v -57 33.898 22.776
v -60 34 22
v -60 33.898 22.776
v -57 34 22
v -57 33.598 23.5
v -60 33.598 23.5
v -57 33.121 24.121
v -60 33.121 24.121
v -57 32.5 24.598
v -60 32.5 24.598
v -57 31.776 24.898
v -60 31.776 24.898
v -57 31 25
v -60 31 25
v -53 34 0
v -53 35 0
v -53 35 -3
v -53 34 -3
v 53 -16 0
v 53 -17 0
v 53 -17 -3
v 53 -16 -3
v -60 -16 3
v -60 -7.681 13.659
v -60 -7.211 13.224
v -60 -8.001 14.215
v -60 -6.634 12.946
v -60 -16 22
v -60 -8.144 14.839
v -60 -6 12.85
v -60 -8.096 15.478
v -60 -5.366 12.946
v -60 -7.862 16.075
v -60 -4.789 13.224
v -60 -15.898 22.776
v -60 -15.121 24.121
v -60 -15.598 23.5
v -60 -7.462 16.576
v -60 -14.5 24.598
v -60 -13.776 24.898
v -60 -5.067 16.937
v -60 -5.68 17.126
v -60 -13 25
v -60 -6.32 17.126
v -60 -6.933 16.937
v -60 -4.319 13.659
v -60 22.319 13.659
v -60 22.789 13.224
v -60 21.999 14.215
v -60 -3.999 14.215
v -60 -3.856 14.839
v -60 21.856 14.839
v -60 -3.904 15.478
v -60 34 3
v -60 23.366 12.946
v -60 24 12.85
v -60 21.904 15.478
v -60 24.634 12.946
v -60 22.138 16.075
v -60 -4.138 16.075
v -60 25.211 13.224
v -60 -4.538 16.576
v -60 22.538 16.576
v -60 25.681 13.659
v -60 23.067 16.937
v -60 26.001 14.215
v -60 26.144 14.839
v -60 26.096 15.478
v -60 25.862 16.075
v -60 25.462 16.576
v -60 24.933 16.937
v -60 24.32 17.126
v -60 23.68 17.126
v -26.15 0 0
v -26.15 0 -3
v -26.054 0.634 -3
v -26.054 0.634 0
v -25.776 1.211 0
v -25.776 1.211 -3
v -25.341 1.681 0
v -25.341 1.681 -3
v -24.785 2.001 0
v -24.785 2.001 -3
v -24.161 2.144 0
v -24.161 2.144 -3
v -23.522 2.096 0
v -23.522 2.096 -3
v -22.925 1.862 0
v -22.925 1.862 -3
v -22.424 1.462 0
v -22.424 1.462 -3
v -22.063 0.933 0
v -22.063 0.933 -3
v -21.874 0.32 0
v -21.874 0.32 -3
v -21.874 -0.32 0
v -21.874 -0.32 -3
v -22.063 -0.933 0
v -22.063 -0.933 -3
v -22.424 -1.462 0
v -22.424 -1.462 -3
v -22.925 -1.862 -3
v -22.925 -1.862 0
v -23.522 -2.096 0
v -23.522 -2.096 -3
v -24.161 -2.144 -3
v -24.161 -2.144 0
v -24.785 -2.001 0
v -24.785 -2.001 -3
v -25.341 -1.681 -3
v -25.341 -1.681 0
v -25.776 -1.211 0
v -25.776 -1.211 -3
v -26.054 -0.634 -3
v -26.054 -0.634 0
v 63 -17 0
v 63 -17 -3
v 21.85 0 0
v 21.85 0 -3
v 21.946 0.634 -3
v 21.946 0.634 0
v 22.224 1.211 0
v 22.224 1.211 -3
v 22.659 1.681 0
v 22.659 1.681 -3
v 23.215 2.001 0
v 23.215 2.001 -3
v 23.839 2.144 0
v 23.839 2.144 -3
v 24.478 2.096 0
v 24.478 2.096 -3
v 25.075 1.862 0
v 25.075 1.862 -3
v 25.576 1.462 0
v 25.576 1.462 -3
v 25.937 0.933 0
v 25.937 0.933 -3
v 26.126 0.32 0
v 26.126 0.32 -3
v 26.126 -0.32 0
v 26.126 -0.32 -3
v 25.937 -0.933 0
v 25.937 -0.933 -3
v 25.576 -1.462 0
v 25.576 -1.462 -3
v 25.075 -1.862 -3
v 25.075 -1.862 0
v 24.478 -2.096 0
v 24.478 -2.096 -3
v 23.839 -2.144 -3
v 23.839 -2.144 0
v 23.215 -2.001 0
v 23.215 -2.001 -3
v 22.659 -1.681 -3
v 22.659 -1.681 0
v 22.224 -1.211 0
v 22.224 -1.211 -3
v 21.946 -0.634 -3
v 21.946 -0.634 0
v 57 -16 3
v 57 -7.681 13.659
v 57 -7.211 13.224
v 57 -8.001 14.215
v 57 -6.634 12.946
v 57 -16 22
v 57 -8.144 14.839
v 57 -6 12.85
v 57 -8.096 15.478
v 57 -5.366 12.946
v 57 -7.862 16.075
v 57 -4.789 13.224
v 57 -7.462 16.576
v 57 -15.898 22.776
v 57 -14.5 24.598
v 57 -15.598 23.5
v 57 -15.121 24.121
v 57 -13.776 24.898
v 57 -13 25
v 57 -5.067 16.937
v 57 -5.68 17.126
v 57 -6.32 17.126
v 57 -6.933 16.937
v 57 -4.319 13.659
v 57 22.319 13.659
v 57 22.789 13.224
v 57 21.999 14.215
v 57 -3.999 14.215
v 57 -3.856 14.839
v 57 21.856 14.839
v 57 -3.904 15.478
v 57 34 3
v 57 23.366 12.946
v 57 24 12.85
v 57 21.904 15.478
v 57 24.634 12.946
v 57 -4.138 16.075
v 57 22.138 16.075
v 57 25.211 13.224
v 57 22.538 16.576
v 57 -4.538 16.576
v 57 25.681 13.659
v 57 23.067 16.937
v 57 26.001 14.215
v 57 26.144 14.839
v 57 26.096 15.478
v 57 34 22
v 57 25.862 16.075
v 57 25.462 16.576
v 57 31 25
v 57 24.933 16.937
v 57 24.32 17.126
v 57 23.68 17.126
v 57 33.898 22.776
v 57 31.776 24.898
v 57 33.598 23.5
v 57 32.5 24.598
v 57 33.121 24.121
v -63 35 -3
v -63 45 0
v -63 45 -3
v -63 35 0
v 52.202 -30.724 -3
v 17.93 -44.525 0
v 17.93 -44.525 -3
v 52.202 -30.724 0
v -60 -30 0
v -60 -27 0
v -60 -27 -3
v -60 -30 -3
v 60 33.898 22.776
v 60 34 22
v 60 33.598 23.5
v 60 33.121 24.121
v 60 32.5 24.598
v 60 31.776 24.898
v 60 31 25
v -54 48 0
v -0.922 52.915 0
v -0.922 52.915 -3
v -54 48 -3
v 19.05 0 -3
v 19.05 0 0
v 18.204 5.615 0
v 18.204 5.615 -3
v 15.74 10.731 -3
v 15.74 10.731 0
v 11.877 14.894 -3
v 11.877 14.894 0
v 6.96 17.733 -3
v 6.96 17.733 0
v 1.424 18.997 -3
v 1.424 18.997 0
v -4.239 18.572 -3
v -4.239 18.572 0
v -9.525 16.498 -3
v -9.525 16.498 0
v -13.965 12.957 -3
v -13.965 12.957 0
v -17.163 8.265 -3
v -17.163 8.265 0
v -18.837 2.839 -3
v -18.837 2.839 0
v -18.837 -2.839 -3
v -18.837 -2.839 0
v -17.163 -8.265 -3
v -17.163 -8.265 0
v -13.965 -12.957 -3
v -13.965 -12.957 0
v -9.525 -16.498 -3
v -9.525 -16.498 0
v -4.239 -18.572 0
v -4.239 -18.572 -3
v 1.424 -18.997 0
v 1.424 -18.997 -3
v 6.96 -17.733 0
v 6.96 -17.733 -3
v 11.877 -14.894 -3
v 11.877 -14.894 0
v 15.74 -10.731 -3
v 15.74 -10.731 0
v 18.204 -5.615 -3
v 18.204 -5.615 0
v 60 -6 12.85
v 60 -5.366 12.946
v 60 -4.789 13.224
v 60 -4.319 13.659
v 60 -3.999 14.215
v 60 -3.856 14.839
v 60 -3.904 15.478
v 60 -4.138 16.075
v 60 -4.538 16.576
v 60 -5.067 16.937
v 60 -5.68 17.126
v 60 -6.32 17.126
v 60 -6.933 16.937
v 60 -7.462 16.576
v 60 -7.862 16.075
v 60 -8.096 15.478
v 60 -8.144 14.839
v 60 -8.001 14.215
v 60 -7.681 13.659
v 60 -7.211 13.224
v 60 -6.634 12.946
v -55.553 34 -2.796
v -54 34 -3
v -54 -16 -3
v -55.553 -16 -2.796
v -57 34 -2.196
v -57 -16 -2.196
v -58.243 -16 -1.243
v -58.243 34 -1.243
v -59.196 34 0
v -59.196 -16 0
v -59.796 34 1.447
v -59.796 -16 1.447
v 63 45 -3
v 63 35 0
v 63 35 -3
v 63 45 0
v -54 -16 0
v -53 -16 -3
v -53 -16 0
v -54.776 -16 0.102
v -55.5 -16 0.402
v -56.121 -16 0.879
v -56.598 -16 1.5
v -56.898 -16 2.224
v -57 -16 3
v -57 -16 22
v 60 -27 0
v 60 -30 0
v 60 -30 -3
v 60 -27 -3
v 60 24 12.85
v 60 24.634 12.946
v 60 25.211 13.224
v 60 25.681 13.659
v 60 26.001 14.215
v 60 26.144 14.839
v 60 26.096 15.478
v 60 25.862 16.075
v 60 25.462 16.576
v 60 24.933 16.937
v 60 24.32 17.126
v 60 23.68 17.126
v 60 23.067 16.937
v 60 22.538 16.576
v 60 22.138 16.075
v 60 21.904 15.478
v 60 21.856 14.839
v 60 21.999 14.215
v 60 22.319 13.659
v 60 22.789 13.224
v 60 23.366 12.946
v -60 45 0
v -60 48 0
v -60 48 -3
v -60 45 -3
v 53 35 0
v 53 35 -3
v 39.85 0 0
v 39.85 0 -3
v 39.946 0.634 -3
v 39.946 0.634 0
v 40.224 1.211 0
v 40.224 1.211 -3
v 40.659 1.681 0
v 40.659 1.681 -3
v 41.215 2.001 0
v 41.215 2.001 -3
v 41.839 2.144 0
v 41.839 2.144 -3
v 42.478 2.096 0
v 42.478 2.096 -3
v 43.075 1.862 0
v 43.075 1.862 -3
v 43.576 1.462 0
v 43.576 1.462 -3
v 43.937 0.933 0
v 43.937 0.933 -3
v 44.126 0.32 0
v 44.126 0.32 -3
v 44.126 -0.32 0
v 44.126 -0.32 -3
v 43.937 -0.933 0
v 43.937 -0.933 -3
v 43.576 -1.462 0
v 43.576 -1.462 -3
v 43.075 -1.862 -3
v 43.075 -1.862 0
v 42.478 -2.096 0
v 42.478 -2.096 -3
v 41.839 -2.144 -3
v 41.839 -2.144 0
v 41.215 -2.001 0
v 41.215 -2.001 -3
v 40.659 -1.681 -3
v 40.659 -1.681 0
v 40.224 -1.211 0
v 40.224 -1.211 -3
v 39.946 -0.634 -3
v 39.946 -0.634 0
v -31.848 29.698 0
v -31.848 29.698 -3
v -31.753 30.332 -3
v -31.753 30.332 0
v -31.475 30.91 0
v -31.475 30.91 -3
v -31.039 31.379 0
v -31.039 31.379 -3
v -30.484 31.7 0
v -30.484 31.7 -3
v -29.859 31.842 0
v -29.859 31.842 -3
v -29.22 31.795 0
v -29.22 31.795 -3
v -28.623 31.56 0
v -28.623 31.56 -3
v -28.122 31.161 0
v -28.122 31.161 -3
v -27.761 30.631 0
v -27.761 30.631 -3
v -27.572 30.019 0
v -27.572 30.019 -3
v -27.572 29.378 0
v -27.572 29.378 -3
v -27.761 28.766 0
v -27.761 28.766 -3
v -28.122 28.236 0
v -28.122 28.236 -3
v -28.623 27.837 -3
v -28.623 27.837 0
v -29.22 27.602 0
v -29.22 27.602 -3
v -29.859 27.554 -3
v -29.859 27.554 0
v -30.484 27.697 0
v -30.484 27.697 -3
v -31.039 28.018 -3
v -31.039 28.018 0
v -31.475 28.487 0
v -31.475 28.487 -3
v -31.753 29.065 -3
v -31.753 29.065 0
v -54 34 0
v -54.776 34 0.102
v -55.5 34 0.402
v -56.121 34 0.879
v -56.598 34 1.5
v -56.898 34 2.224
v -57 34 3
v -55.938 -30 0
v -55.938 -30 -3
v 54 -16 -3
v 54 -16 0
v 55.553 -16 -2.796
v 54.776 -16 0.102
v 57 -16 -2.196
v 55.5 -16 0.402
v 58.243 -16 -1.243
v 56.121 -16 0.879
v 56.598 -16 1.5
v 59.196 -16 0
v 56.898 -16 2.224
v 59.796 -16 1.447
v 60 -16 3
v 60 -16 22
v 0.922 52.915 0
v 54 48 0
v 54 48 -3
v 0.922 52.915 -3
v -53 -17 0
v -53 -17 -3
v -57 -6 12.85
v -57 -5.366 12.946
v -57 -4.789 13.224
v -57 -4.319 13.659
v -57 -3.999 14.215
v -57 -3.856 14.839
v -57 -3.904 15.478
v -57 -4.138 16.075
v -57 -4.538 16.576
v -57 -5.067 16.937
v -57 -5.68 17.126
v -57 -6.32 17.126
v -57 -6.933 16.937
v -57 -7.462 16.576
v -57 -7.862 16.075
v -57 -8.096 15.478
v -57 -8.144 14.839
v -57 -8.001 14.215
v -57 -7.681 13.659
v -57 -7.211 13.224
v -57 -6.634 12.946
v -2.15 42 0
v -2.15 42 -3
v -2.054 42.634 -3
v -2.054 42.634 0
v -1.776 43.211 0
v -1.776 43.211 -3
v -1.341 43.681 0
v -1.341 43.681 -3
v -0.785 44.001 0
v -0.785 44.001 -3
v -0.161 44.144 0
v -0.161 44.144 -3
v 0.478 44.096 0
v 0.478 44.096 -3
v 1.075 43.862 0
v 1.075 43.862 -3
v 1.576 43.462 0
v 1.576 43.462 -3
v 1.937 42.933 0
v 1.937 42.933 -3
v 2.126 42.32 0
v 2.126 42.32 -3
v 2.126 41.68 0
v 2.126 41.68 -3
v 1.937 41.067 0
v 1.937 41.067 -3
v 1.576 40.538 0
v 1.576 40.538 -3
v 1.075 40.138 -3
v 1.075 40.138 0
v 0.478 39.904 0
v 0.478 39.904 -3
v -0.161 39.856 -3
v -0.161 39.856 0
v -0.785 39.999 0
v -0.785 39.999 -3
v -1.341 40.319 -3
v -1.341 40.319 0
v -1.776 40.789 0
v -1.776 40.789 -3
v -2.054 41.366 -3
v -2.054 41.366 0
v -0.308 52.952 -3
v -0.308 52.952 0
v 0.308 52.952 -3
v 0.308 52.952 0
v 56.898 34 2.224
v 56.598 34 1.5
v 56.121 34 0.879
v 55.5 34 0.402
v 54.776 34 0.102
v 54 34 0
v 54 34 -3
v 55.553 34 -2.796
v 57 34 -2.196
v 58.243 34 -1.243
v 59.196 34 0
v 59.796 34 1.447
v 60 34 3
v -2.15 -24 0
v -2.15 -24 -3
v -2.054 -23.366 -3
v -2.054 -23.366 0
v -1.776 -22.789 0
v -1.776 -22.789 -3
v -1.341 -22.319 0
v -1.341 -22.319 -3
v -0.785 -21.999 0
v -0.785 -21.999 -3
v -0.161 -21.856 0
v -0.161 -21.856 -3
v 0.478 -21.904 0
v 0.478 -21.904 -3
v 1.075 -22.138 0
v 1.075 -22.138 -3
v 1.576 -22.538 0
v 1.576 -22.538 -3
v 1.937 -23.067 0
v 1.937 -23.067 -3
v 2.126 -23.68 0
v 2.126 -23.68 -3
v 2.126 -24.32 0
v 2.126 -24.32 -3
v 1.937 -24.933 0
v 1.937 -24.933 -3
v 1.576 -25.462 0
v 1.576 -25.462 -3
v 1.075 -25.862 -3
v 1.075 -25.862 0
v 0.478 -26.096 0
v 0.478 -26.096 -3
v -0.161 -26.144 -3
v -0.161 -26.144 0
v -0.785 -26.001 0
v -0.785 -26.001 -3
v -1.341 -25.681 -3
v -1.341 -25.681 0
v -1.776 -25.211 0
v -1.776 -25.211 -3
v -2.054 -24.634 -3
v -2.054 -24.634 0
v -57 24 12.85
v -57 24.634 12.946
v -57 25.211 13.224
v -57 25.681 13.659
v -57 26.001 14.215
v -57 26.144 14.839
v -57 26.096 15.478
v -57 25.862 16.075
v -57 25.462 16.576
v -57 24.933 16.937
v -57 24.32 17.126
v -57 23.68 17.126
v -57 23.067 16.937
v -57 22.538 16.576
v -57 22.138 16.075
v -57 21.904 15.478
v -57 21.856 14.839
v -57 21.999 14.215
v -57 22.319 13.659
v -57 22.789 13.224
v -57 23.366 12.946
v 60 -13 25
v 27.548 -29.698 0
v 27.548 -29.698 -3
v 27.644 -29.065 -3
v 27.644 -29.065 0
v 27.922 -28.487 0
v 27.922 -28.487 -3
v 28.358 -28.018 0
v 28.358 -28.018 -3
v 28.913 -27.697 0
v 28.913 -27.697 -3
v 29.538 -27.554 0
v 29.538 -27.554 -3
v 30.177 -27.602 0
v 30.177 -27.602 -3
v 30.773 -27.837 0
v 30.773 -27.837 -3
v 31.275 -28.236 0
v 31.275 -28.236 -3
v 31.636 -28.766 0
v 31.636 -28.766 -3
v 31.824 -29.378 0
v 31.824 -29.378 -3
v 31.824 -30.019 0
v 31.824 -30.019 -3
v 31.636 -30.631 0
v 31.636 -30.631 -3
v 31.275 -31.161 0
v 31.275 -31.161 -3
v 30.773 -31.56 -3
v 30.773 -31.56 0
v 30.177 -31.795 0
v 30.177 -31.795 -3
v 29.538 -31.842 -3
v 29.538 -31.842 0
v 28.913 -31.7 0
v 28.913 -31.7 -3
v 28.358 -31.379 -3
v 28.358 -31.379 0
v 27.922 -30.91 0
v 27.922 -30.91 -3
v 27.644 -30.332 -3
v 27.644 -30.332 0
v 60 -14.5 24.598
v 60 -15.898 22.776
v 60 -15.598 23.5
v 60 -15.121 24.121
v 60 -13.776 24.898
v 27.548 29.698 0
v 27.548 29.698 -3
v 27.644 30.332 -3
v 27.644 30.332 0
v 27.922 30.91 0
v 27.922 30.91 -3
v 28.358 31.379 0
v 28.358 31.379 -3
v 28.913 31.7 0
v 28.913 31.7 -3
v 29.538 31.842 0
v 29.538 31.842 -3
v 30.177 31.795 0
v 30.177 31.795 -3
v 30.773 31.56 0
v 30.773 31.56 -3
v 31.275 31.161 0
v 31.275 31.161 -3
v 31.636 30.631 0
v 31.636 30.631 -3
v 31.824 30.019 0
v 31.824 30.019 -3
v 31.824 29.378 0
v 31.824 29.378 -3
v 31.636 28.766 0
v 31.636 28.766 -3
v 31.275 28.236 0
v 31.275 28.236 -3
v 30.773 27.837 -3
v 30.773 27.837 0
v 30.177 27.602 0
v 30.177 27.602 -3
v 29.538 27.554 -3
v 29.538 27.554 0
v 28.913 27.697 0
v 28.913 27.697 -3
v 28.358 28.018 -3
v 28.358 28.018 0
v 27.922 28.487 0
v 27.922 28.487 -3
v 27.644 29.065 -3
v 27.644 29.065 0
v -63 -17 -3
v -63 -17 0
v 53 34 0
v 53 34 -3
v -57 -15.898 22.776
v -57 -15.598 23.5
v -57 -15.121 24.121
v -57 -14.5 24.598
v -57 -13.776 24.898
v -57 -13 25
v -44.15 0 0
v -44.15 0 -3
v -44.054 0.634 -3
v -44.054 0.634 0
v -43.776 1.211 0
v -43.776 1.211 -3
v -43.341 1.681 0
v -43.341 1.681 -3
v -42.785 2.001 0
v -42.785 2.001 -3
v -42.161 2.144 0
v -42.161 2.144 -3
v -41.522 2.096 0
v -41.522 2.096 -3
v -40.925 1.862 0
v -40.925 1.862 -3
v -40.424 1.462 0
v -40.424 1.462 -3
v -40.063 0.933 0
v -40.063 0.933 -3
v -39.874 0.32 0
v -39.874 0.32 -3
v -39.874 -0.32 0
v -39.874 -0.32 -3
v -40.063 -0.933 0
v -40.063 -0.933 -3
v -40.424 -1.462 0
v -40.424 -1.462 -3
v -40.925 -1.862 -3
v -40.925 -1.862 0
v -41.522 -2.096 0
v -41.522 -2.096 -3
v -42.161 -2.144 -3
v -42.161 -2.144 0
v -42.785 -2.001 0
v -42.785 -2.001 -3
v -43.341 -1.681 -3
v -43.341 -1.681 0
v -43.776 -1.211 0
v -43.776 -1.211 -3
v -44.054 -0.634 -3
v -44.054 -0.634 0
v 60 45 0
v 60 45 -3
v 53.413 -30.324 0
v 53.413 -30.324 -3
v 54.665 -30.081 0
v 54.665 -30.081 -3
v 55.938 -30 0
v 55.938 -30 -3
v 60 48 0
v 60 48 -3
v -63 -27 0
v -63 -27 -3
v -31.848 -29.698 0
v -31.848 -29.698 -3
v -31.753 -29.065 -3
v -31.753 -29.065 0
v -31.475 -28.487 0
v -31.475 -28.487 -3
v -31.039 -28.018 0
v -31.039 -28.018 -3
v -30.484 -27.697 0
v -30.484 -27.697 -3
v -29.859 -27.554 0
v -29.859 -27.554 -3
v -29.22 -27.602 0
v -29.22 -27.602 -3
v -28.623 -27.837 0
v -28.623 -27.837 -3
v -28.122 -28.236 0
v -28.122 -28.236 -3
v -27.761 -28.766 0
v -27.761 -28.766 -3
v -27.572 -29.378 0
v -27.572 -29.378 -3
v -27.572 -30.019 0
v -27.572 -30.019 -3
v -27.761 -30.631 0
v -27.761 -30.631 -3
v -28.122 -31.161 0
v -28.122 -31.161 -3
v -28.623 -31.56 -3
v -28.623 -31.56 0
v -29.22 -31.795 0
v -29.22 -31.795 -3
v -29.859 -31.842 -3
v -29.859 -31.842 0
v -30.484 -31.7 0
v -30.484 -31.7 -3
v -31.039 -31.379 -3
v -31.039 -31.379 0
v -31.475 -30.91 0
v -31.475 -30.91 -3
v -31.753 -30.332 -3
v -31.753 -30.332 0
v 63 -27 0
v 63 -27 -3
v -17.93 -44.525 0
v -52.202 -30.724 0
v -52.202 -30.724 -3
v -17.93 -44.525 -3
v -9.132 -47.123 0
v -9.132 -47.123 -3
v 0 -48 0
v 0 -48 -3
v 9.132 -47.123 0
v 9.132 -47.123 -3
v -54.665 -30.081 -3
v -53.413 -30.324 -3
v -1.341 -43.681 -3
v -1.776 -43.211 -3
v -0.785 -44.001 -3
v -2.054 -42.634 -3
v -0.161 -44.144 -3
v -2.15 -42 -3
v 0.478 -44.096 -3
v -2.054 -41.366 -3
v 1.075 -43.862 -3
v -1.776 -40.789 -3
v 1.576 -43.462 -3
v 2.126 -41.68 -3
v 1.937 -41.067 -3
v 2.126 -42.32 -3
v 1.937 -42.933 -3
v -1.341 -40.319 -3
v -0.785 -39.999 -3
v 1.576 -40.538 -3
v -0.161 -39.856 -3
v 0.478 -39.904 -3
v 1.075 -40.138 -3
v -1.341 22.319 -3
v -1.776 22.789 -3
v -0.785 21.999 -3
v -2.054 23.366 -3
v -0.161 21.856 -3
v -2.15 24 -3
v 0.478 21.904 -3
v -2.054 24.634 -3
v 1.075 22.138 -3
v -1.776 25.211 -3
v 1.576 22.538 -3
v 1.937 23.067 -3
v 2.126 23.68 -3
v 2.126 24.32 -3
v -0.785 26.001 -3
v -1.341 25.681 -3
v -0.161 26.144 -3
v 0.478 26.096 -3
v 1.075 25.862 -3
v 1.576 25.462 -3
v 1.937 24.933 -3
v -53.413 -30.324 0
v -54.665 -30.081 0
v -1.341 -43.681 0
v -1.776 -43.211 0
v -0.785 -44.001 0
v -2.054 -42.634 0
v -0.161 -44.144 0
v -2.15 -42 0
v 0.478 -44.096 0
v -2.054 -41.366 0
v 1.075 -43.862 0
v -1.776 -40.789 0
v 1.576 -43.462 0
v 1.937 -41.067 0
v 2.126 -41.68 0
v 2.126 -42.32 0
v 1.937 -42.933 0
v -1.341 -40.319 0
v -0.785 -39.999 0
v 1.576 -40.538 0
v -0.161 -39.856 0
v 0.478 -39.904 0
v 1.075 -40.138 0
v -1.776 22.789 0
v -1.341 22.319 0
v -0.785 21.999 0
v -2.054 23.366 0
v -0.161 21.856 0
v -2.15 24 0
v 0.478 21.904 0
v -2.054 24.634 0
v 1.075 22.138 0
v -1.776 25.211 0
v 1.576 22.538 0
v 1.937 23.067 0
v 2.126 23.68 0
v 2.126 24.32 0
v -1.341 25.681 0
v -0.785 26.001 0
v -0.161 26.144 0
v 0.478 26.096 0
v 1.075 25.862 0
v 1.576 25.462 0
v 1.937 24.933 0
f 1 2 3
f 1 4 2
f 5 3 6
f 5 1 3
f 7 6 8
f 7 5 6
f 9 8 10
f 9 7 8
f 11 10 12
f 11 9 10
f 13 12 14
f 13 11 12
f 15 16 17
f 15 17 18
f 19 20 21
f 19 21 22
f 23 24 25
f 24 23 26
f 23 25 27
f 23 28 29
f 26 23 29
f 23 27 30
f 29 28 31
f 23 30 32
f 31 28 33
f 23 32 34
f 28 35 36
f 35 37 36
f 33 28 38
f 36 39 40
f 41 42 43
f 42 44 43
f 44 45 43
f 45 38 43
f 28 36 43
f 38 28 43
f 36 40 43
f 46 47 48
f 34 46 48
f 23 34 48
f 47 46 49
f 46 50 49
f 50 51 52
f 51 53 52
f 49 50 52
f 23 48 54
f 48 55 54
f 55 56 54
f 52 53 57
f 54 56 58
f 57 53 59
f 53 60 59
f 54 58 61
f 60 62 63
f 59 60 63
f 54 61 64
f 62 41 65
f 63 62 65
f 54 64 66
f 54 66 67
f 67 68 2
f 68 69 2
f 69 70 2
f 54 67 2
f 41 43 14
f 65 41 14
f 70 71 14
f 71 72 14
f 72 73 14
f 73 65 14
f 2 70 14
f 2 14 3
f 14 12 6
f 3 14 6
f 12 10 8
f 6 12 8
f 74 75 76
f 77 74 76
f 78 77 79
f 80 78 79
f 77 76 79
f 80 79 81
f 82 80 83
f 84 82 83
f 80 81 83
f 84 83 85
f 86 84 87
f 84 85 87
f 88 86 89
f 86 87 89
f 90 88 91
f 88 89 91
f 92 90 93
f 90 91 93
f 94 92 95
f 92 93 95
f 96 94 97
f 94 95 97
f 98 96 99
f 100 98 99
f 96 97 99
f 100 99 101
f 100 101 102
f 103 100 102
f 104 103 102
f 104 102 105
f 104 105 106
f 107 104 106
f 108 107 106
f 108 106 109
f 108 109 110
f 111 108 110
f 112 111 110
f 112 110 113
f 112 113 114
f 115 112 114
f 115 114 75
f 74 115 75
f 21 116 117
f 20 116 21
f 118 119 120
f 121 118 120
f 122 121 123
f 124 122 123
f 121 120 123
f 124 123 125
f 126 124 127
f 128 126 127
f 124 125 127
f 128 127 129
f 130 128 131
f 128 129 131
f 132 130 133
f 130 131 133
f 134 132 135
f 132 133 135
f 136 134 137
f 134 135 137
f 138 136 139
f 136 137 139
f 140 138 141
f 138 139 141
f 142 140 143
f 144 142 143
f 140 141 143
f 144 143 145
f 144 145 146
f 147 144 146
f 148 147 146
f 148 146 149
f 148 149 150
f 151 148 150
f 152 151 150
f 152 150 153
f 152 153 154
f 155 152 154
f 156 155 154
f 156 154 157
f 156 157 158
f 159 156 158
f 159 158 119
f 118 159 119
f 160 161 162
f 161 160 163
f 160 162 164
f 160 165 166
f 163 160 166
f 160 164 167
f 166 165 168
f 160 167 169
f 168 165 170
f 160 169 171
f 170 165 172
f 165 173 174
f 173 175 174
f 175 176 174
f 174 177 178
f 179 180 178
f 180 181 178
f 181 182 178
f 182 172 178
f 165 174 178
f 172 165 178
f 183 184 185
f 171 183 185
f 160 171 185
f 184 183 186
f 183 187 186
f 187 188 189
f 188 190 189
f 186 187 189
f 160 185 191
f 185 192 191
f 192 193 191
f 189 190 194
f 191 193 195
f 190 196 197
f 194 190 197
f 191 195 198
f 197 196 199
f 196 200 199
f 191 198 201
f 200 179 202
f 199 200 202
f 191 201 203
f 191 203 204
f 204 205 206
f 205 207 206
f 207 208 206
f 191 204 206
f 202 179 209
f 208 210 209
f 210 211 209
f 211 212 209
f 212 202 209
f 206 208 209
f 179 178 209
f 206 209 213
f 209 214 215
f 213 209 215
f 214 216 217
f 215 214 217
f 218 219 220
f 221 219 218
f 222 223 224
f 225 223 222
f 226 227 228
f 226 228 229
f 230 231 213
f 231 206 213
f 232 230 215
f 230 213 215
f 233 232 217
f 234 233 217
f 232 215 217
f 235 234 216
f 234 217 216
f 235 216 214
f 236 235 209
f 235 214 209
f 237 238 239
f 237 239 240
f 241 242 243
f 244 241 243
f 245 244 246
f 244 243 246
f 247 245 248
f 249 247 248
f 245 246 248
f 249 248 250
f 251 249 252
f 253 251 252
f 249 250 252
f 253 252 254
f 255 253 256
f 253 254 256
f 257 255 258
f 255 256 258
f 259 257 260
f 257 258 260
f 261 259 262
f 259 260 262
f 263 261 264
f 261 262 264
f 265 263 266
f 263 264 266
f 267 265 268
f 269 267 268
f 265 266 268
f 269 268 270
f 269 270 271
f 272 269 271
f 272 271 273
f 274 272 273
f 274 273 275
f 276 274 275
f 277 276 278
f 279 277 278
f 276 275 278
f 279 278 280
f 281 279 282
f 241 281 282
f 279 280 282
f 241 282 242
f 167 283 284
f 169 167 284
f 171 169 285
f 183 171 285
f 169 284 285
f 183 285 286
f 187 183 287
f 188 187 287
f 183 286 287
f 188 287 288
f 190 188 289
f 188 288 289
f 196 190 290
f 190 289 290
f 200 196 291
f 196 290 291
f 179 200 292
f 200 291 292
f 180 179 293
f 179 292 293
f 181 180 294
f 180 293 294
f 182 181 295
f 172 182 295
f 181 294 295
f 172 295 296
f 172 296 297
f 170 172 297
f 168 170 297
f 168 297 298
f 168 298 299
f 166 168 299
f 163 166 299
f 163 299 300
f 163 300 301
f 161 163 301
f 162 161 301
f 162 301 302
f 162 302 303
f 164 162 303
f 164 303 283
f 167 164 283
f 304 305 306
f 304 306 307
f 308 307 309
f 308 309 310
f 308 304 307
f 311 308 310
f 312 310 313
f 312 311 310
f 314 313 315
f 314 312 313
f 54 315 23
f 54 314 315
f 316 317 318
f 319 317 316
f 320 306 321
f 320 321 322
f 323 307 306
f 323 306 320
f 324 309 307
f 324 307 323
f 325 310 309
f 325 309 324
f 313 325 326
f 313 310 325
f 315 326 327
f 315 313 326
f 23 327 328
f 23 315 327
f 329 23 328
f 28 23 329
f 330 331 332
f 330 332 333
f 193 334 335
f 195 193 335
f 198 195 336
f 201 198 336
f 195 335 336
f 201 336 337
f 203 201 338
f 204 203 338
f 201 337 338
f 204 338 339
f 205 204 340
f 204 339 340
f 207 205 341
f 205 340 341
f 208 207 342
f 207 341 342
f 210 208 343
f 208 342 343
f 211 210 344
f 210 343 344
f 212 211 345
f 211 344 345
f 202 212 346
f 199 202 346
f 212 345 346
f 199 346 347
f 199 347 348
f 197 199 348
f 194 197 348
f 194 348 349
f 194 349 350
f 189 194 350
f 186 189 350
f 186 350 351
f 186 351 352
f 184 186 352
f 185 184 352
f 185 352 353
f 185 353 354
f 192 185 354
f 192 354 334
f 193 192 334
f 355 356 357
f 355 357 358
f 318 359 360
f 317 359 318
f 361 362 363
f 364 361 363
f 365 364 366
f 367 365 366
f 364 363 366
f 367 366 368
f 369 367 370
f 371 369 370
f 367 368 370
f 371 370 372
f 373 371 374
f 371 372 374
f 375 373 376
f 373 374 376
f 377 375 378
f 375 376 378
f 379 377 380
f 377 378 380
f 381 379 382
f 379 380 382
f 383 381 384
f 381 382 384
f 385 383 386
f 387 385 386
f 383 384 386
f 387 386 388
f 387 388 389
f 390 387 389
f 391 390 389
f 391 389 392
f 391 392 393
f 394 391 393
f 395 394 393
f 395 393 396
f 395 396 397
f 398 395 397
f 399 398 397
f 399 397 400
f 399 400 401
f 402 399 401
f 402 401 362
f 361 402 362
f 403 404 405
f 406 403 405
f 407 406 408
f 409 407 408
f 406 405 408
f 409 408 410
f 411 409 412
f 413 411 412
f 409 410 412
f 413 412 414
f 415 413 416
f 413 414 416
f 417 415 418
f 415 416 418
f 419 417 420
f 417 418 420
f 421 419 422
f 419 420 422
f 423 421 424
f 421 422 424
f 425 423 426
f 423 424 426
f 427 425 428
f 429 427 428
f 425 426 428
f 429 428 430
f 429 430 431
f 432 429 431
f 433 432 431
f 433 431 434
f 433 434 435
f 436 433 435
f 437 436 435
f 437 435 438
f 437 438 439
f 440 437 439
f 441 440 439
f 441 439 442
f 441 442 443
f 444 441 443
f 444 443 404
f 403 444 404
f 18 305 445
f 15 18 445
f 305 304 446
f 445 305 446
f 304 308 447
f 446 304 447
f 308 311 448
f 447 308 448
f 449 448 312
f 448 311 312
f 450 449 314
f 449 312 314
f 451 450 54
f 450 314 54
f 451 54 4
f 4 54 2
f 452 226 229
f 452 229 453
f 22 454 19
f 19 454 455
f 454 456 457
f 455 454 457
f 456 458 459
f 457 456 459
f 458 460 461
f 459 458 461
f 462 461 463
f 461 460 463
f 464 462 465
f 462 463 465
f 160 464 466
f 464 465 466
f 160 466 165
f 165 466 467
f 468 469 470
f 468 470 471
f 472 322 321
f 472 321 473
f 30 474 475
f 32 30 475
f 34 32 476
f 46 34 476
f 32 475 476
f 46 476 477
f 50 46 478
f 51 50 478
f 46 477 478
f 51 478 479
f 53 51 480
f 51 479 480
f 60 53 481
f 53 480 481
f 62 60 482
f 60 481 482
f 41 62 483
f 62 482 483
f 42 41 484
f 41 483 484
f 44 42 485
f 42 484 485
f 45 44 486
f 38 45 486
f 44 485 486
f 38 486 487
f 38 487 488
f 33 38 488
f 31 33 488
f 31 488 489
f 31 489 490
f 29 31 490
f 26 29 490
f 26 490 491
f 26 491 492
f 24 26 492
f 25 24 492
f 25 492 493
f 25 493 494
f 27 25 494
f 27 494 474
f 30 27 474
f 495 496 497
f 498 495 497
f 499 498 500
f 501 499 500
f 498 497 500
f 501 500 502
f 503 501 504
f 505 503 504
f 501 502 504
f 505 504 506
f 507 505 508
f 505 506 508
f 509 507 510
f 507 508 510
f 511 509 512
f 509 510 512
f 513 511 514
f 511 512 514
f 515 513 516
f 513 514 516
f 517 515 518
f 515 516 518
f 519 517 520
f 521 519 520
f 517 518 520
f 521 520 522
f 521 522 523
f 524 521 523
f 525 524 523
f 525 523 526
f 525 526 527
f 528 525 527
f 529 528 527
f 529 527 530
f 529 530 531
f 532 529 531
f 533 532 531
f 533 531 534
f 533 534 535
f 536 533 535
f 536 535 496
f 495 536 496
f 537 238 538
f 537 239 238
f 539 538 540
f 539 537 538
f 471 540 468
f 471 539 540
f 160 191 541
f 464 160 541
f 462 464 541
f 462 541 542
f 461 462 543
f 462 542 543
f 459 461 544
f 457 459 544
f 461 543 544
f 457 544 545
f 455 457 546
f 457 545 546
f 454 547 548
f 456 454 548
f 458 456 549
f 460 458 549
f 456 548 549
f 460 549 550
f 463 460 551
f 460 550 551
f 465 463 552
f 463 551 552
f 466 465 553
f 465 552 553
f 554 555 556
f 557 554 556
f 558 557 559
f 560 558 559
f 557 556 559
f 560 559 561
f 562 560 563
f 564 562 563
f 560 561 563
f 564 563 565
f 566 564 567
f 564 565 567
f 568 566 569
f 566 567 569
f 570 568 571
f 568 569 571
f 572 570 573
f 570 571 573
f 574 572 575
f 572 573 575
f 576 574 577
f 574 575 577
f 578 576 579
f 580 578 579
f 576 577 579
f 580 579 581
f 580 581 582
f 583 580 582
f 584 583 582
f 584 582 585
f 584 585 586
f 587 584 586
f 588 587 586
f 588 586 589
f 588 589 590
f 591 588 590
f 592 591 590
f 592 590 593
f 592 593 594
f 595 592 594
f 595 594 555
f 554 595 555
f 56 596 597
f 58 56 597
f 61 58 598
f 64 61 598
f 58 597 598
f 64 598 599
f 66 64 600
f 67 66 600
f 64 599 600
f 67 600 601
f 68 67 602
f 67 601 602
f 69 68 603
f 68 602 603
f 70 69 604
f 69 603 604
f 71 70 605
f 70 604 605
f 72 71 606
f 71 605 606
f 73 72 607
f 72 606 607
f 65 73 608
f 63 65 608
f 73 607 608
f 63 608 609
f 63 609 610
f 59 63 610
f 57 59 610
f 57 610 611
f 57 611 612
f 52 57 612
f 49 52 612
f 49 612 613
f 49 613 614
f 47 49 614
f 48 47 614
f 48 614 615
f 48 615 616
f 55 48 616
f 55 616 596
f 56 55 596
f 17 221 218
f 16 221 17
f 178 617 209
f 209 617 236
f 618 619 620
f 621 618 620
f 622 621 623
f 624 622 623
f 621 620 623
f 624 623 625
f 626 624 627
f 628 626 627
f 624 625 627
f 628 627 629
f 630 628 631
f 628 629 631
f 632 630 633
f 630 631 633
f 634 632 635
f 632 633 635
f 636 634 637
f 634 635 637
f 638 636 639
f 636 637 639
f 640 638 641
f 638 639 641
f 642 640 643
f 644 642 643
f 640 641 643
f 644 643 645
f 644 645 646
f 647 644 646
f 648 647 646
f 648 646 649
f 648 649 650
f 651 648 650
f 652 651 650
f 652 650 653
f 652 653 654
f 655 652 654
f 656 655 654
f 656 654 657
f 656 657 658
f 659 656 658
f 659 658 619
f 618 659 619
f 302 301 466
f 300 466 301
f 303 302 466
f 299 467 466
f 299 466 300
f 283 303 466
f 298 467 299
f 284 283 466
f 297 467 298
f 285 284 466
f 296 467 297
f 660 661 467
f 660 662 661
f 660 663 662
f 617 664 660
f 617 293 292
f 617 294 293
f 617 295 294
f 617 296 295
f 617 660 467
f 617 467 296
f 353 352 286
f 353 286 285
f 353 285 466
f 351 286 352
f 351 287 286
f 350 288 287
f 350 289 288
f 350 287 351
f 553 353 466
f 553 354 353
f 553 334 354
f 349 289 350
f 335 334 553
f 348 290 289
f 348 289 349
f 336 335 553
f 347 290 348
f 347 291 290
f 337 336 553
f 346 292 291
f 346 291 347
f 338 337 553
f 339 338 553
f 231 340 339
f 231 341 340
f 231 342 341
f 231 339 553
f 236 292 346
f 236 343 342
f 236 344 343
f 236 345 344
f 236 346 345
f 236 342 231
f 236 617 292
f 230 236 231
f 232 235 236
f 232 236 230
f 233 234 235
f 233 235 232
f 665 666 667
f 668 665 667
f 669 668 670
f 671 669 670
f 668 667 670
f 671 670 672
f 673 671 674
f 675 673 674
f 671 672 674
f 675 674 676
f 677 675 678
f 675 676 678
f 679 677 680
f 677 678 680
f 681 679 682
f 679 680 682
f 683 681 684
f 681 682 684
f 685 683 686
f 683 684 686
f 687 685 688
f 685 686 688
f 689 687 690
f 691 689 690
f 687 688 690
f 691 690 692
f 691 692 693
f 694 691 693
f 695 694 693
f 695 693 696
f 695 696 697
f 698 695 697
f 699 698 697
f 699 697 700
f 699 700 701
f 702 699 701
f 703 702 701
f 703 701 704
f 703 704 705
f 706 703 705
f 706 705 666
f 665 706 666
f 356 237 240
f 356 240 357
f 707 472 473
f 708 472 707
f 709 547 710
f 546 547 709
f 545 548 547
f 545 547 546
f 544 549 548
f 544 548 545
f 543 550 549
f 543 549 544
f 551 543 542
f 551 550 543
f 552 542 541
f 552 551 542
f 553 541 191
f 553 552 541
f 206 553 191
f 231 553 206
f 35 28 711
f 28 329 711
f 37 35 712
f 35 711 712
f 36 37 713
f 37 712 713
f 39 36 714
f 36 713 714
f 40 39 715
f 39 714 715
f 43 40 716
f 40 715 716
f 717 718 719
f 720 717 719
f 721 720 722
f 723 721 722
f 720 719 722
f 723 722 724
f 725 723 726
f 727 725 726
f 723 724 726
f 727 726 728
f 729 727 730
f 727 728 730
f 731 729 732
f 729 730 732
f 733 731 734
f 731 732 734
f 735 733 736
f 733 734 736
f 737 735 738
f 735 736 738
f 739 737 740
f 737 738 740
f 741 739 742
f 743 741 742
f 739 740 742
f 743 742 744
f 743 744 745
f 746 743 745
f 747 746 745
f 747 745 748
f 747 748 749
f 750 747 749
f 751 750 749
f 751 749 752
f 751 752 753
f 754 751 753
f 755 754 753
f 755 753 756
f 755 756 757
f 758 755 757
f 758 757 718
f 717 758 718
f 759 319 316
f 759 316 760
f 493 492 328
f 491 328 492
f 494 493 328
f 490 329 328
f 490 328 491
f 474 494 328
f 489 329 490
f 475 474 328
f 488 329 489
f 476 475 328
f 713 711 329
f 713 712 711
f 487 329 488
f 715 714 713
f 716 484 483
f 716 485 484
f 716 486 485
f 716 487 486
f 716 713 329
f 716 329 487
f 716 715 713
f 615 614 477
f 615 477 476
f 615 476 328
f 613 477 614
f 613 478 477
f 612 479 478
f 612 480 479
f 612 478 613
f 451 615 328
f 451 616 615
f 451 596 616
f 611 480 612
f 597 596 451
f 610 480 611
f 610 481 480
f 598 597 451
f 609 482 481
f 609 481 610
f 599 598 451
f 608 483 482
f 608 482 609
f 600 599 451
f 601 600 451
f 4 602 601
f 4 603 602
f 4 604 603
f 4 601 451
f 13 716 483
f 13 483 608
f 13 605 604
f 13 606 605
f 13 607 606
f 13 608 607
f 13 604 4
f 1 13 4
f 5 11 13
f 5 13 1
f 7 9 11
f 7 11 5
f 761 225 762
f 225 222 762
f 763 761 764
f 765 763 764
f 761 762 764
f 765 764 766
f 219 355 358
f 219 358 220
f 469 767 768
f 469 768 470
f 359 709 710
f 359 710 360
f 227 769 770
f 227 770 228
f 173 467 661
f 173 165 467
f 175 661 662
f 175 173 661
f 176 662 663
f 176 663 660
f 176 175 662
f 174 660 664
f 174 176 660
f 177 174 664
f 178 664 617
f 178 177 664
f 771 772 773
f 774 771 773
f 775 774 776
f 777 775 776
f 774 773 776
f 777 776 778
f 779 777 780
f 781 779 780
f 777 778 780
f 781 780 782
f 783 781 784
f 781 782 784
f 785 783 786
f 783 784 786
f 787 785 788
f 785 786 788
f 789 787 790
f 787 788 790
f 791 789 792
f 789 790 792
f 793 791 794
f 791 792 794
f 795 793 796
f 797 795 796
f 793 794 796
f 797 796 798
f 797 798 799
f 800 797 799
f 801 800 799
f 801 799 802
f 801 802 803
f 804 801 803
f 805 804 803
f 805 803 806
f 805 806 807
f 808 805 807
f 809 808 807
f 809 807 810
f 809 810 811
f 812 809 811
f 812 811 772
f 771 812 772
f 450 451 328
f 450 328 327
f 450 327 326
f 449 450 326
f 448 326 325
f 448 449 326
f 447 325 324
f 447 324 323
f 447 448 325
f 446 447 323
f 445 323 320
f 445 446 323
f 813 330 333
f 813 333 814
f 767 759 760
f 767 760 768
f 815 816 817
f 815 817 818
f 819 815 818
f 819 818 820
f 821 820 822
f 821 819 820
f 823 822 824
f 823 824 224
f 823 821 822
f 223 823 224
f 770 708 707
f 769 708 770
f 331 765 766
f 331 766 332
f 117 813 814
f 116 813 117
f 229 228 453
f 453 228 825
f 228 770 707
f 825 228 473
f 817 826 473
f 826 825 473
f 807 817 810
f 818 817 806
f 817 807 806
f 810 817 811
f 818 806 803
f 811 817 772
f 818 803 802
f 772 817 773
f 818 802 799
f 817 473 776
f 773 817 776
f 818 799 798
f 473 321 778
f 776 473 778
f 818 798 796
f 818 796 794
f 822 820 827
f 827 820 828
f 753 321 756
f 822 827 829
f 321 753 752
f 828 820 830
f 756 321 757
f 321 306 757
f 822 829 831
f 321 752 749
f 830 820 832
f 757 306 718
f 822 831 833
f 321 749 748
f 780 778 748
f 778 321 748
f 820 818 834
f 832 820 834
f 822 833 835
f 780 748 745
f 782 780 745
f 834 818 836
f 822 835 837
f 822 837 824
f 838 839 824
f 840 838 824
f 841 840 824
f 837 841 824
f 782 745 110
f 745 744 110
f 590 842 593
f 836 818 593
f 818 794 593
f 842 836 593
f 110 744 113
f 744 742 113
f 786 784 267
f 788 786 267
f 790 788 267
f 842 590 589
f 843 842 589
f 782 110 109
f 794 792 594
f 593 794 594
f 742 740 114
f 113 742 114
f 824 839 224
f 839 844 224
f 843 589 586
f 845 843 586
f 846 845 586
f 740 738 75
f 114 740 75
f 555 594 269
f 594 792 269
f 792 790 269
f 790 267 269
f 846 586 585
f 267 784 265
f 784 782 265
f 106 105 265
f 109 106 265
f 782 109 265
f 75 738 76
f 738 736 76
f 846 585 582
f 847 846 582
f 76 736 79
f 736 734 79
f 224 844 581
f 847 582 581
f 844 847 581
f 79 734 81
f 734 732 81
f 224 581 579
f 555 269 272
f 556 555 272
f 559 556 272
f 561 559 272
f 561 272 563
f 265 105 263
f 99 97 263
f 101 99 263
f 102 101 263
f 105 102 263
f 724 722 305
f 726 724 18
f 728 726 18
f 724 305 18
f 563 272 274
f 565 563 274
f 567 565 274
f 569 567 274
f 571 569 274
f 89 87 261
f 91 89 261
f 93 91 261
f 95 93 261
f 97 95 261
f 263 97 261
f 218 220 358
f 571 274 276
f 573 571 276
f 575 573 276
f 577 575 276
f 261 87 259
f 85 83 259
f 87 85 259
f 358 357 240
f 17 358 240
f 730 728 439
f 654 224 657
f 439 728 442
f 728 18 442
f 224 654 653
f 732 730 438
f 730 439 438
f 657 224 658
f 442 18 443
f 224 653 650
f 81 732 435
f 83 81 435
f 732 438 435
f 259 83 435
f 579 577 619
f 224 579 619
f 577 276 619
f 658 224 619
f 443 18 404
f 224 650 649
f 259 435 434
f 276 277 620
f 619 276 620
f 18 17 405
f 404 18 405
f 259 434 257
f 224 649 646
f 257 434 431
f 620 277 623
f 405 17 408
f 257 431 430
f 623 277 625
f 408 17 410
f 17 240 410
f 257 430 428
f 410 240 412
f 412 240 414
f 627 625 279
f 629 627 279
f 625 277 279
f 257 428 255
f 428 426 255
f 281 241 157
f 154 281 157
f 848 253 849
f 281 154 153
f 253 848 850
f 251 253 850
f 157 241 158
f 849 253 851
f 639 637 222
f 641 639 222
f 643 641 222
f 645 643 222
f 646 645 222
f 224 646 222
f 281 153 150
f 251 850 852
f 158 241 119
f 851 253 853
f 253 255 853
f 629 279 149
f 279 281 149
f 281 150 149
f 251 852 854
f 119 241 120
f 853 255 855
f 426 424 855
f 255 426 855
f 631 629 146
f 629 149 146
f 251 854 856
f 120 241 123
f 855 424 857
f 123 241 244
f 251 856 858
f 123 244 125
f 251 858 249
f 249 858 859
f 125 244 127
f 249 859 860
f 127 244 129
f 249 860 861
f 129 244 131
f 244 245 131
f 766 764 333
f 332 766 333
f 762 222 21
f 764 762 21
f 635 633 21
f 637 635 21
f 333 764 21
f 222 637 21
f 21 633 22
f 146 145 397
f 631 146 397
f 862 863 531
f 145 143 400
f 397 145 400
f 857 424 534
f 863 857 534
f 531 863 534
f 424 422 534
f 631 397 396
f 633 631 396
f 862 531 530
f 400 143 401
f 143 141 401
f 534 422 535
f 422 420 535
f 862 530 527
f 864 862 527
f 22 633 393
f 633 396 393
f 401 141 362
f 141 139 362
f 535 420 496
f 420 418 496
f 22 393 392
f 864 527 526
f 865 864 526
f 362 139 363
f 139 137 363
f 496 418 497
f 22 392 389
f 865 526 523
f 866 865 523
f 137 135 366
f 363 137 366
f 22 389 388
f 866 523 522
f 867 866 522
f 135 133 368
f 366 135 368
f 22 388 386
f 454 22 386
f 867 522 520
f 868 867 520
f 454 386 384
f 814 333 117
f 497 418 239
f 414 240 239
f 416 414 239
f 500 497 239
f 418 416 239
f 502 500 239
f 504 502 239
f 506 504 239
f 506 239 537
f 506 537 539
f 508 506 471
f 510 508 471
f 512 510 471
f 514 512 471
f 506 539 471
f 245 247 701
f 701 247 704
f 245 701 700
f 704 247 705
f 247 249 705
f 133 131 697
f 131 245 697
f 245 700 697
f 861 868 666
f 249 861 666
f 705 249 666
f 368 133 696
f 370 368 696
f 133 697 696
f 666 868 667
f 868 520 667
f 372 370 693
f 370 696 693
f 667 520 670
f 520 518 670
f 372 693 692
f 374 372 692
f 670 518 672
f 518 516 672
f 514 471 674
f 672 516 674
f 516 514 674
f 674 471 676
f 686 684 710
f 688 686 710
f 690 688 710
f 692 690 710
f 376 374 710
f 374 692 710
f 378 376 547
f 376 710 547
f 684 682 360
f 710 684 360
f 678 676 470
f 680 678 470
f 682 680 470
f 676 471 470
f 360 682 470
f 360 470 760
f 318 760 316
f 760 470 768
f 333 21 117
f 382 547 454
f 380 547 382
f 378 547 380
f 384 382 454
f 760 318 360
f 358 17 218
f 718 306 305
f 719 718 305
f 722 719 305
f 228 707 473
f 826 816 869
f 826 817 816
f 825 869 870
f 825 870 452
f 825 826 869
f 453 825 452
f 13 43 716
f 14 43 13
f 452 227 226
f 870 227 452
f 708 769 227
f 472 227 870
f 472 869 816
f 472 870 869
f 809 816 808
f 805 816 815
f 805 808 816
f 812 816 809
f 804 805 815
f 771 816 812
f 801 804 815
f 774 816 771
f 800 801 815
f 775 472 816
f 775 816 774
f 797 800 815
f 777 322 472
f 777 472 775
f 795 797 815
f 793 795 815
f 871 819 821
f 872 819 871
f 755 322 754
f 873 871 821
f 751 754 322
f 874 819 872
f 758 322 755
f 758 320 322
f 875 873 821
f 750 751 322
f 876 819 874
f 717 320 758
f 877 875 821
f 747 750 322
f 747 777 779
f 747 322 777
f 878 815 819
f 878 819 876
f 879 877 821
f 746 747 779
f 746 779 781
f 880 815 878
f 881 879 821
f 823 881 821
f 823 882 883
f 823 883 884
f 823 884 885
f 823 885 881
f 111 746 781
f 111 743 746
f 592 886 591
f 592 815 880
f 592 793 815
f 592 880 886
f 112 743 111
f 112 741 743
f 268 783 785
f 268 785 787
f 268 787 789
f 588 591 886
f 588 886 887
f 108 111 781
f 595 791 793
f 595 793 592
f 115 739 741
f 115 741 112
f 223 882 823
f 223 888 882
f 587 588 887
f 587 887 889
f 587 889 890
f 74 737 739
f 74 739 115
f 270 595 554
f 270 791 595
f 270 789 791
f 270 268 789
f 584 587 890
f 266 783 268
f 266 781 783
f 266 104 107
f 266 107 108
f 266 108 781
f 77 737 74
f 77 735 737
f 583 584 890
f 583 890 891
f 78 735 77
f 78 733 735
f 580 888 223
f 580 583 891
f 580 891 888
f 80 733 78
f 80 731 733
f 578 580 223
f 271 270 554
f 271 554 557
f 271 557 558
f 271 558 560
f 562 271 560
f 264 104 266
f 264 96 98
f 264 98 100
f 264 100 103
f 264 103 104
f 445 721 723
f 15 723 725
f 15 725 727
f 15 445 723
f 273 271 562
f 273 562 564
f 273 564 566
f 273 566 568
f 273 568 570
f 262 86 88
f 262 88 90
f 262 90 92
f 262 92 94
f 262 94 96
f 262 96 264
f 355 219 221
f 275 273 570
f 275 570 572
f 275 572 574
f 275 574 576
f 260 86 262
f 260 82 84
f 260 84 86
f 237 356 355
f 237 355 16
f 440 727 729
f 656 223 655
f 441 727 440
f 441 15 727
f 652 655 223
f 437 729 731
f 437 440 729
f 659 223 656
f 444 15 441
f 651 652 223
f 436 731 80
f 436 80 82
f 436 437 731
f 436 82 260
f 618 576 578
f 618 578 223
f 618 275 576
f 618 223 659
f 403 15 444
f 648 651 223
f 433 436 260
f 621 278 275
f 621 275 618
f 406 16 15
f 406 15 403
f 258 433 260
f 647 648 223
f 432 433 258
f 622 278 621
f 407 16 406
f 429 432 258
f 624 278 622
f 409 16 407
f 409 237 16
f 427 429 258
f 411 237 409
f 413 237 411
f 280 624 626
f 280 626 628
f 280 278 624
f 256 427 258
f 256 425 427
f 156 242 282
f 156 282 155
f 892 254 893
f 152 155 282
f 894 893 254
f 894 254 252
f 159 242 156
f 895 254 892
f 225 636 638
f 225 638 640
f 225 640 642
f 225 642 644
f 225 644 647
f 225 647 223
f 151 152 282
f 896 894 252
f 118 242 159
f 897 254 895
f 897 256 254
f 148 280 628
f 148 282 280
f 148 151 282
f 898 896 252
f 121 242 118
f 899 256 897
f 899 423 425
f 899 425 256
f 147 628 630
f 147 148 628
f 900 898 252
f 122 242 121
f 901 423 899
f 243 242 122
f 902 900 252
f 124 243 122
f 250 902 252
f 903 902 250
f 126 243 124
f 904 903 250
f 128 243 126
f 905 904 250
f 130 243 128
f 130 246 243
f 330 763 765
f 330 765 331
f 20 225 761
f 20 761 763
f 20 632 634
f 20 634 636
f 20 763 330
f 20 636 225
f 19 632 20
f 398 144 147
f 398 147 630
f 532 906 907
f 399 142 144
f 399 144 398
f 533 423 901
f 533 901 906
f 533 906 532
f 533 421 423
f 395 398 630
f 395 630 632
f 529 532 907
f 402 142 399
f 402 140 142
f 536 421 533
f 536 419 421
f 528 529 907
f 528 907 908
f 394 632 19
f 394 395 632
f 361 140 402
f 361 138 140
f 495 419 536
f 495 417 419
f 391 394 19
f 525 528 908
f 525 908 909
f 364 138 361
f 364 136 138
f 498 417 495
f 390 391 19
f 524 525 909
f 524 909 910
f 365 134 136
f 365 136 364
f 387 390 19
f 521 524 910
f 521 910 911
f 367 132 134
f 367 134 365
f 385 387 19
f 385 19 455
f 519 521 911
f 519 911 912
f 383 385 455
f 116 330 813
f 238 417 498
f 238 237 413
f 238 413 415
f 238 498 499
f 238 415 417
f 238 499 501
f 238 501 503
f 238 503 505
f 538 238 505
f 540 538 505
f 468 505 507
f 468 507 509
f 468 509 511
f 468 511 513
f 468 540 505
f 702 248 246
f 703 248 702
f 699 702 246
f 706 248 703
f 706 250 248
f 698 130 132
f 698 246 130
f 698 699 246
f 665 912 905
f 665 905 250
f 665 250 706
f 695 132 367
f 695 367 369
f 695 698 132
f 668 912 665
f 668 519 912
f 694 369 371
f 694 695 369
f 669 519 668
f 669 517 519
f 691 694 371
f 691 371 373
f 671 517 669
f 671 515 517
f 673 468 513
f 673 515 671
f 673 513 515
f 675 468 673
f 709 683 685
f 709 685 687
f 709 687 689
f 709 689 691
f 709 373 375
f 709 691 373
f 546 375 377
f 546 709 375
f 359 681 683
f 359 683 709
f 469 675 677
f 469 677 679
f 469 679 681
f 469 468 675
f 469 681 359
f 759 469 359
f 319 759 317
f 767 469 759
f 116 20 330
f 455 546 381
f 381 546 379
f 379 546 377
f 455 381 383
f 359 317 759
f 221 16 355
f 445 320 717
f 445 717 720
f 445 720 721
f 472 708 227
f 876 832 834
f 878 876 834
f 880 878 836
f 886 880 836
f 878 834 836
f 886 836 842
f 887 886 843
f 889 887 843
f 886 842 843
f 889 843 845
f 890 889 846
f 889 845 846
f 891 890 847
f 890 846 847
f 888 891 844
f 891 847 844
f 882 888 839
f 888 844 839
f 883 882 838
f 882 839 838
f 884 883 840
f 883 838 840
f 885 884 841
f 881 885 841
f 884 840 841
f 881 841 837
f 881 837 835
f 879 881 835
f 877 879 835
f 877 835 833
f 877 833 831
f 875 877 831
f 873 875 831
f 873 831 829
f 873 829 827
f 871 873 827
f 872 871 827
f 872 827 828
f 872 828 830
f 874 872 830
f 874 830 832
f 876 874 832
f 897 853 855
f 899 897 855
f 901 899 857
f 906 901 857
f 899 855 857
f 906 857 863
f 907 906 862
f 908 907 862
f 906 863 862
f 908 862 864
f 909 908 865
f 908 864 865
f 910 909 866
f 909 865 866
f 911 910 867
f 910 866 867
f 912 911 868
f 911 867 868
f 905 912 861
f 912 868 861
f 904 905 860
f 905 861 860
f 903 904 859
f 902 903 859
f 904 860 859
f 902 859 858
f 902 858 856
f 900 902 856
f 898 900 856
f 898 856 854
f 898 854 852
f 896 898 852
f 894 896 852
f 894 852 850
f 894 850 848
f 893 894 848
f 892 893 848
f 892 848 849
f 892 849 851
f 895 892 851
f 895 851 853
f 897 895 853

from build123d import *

# Parameters (mm, degrees)
SKETCH1_R                = 19.05
SKETCH1_R_2              = 1
BASE_FLANGE1_DEPTH       = 3
UP_DEPTH                 = 50
UP_START                 = -3
UP_PROFILE_W             = 50
UP_PROFILE_H             = 22
UP_PROFILE_R             = 1
UP_FLAT_DEPTH            = 3
M4_CLEARANCE_HOLE1_D     = 4.3
M4_CLEARANCE_HOLE1_DEPTH = 136
M4_CLEARANCE_HOLE1_TIP   = 1.291850331
M4_CLEARANCE_HOLE2_D     = 4.3
M4_CLEARANCE_HOLE2_DEPTH = 136
M4_CLEARANCE_HOLE2_TIP   = 1.291850331
FILLET1_R                = 10
FILLET2_R                = 3


# Sheet-metal steps are written as plain solids
with BuildPart() as part:
    # Sketch1 → Base-Flange1 (new body)
    with BuildSketch(Plane.XY):
        with BuildLine():
            Line((-54, -30), (-17.930398419, -44.525282846))
            ThreePointArc((-17.930398419, -44.525282846), (0, -48), (17.930398419, -44.525282846))
            Line((17.930398419, -44.525282846), (54, -30))
            Line((54, -30), (60, -30))
            Line((60, -30), (60, -27))
            Line((60, -27), (63, -27))
            Line((63, -27), (63, -17))
            Line((63, -17), (53, -17))
            Line((53, -17), (53, -16))
            Line((53, -16), (54, -16))
            Line((54, -16), (54, 34))
            Line((54, 34), (53, 34))
            Line((53, 34), (53, 35))
            Line((53, 35), (63, 35))
            Line((63, 35), (63, 45))
            Line((63, 45), (60, 45))
            Line((60, 45), (60, 48))
            Line((60, 48), (54, 48))
            Line((54, 48), (0, 53))
            Line((0, 53), (-54, 48))
            Line((-54, 48), (-60, 48))
            Line((-60, 48), (-60, 45))
            Line((-60, 45), (-63, 45))
            Line((-63, 45), (-63, 35))
            Line((-63, 35), (-53, 35))
            Line((-53, 35), (-53, 34))
            Line((-53, 34), (-54, 34))
            Line((-54, 34), (-54, -16))
            Line((-54, -16), (-53, -16))
            Line((-53, -16), (-53, -17))
            Line((-53, -17), (-63, -17))
            Line((-63, -17), (-63, -27))
            Line((-63, -27), (-60, -27))
            Line((-60, -27), (-60, -30))
            Line((-60, -30), (-54, -30))
        make_face()
        Circle(SKETCH1_R, mode=Mode.SUBTRACT)
        with Locations((0, 24)):
            Circle(SKETCH1_R_2, mode=Mode.SUBTRACT)
        with Locations((0, -42)):
            Circle(SKETCH1_R_2, mode=Mode.SUBTRACT)
        with Locations((-29.69848481, -29.69848481)):
            Circle(SKETCH1_R_2, mode=Mode.SUBTRACT)
        with Locations((-42, 0)):
            Circle(SKETCH1_R_2, mode=Mode.SUBTRACT)
        with Locations((-29.69848481, 29.69848481)):
            Circle(SKETCH1_R_2, mode=Mode.SUBTRACT)
        with Locations((0, 42)):
            Circle(SKETCH1_R_2, mode=Mode.SUBTRACT)
        with Locations((29.69848481, 29.69848481)):
            Circle(SKETCH1_R_2, mode=Mode.SUBTRACT)
        with Locations((42, 0)):
            Circle(SKETCH1_R_2, mode=Mode.SUBTRACT)
        with Locations((29.69848481, -29.69848481)):
            Circle(SKETCH1_R_2, mode=Mode.SUBTRACT)
        with Locations((24, 0)):
            Circle(SKETCH1_R_2, mode=Mode.SUBTRACT)
        with Locations((0, -24)):
            Circle(SKETCH1_R_2, mode=Mode.SUBTRACT)
        with Locations((-24, 0)):
            Circle(SKETCH1_R_2, mode=Mode.SUBTRACT)
    extrude(amount=-BASE_FLANGE1_DEPTH)

    # UP bend section (across the edge) → UP (add)
    with BuildSketch(Plane(origin=(-57, 34, 0), x_dir=(1, 0, 0), z_dir=(0, -1, 0))):
        with BuildLine():
            Line((-3, 3), (0, 3))
            ThreePointArc((0, 3), (0.878679656, 0.878679656), (3, 0))
            Line((3, 0), (3, -3))
            ThreePointArc((3, -3), (-1.242640687, -1.242640687), (-3, 3))
        make_face()
    up = extrude(amount=UP_DEPTH)

    # UP profile (on flange) → UP flat (add)
    with BuildSketch(Plane.YZ.offset(-57).offset(UP_START)):
        with Locations((9, 14)):
            Rectangle(UP_PROFILE_W, UP_PROFILE_H)
        with Locations((-6, 15)):
            Circle(UP_PROFILE_R, mode=Mode.SUBTRACT)
        with Locations((24, 15)):
            Circle(UP_PROFILE_R, mode=Mode.SUBTRACT)
    up_flat = extrude(amount=UP_FLAT_DEPTH)

    # Mirror1: UP, UP flat across plane
    add(up.mirror(Plane(origin=(0, 0, 0), x_dir=(0, 0, 1), z_dir=(1, 0, 0))))
    add(up_flat.mirror(Plane(origin=(0, 0, 0), x_dir=(0, 0, 1), z_dir=(1, 0, 0))))

    # M4 Clearance Hole1
    with Locations(Plane.XY):
        with Locations((0, 24), (24, 0), (-24, 0), (0, -24), (0, -42), (29.69848481, -29.69848481), (42, 0), (29.69848481, 29.69848481), (0, 42), (-29.69848481, 29.69848481), (-42, 0), (-29.69848481, -29.69848481)):
            Hole(M4_CLEARANCE_HOLE1_D / 2, depth=M4_CLEARANCE_HOLE1_DEPTH)
            with Locations((0, 0, -(M4_CLEARANCE_HOLE1_DEPTH + M4_CLEARANCE_HOLE1_TIP / 2))):  # 118° drill point
                Cone(0, M4_CLEARANCE_HOLE1_D / 2, M4_CLEARANCE_HOLE1_TIP, mode=Mode.SUBTRACT)

    # M4 Clearance Hole2
    with Locations(Plane.ZY.offset(60)):
        with Locations((15, 24), (15, -6)):
            Hole(M4_CLEARANCE_HOLE2_D / 2, depth=M4_CLEARANCE_HOLE2_DEPTH)
            with Locations((0, 0, -(M4_CLEARANCE_HOLE2_DEPTH + M4_CLEARANCE_HOLE2_TIP / 2))):  # 118° drill point
                Cone(0, M4_CLEARANCE_HOLE2_D / 2, M4_CLEARANCE_HOLE2_TIP, mode=Mode.SUBTRACT)

    # Fillet1
    fillet1_edges = [part.edges().sort_by_distance(p)[0] for p in [
        (0, 53, -1.5),
        (54, -30, -1.5),
        (-54, -30, -1.5),
    ]]
    fillet(fillet1_edges, radius=FILLET1_R)

    # Fillet2
    fillet2_edges = [part.edges().sort_by_distance(p)[0] for p in [
        (-58.5, 34, 25),
        (-58.5, -16, 25),
        (58.5, -16, 25),
        (58.5, 34, 25),
    ]]
    fillet(fillet2_edges, radius=FILLET2_R)


solid = part.part
